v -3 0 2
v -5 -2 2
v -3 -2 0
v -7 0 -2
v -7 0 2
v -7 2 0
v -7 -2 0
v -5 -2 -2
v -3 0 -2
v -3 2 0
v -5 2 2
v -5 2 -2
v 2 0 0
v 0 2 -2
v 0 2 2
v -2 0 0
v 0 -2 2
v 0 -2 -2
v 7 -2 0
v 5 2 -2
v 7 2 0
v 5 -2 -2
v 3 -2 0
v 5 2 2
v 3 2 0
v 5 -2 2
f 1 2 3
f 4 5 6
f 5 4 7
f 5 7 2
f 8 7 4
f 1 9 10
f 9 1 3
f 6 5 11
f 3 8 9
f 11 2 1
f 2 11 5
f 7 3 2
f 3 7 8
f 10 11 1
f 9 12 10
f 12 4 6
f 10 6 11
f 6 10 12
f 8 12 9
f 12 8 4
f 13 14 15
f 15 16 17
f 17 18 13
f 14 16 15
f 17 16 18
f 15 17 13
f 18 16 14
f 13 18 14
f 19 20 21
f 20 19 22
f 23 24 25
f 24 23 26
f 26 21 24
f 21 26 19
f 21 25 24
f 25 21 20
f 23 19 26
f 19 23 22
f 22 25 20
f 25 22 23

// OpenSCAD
translate([-5,0,0]) hull() {
  union() {
    rotate([90,0,0]) {
      translate([0,0,0]) {
        cylinder(r=2, h=4, $fn=4, center=true);
        group();
      }
      group();
    }
    translate([0,0,0]) {
      cylinder(r=2, h=4, $fn=4, center=true);
    }
  }
}

hull() {
  intersection() {
    rotate([90,0,0]) {
      translate([0,0,0]) {
        cylinder(r=2, h=4, $fn=4, center=true);
        group();
      }
      group();
    }
    translate([0,0,0]) {
      cylinder(r=2, h=4, $fn=4, center=true);
    }
  }
}

translate([5,0,0]) hull() {
  difference() {
    rotate([90,0,0]) {
      translate([0,0,0]) {
        cylinder(r=2, h=4, $fn=4, center=true);
        group();
      }
      group();
    }
    translate([0,0,0]) {
      cylinder(r=2, h=4, $fn=4, center=true);
    }
  }
}
